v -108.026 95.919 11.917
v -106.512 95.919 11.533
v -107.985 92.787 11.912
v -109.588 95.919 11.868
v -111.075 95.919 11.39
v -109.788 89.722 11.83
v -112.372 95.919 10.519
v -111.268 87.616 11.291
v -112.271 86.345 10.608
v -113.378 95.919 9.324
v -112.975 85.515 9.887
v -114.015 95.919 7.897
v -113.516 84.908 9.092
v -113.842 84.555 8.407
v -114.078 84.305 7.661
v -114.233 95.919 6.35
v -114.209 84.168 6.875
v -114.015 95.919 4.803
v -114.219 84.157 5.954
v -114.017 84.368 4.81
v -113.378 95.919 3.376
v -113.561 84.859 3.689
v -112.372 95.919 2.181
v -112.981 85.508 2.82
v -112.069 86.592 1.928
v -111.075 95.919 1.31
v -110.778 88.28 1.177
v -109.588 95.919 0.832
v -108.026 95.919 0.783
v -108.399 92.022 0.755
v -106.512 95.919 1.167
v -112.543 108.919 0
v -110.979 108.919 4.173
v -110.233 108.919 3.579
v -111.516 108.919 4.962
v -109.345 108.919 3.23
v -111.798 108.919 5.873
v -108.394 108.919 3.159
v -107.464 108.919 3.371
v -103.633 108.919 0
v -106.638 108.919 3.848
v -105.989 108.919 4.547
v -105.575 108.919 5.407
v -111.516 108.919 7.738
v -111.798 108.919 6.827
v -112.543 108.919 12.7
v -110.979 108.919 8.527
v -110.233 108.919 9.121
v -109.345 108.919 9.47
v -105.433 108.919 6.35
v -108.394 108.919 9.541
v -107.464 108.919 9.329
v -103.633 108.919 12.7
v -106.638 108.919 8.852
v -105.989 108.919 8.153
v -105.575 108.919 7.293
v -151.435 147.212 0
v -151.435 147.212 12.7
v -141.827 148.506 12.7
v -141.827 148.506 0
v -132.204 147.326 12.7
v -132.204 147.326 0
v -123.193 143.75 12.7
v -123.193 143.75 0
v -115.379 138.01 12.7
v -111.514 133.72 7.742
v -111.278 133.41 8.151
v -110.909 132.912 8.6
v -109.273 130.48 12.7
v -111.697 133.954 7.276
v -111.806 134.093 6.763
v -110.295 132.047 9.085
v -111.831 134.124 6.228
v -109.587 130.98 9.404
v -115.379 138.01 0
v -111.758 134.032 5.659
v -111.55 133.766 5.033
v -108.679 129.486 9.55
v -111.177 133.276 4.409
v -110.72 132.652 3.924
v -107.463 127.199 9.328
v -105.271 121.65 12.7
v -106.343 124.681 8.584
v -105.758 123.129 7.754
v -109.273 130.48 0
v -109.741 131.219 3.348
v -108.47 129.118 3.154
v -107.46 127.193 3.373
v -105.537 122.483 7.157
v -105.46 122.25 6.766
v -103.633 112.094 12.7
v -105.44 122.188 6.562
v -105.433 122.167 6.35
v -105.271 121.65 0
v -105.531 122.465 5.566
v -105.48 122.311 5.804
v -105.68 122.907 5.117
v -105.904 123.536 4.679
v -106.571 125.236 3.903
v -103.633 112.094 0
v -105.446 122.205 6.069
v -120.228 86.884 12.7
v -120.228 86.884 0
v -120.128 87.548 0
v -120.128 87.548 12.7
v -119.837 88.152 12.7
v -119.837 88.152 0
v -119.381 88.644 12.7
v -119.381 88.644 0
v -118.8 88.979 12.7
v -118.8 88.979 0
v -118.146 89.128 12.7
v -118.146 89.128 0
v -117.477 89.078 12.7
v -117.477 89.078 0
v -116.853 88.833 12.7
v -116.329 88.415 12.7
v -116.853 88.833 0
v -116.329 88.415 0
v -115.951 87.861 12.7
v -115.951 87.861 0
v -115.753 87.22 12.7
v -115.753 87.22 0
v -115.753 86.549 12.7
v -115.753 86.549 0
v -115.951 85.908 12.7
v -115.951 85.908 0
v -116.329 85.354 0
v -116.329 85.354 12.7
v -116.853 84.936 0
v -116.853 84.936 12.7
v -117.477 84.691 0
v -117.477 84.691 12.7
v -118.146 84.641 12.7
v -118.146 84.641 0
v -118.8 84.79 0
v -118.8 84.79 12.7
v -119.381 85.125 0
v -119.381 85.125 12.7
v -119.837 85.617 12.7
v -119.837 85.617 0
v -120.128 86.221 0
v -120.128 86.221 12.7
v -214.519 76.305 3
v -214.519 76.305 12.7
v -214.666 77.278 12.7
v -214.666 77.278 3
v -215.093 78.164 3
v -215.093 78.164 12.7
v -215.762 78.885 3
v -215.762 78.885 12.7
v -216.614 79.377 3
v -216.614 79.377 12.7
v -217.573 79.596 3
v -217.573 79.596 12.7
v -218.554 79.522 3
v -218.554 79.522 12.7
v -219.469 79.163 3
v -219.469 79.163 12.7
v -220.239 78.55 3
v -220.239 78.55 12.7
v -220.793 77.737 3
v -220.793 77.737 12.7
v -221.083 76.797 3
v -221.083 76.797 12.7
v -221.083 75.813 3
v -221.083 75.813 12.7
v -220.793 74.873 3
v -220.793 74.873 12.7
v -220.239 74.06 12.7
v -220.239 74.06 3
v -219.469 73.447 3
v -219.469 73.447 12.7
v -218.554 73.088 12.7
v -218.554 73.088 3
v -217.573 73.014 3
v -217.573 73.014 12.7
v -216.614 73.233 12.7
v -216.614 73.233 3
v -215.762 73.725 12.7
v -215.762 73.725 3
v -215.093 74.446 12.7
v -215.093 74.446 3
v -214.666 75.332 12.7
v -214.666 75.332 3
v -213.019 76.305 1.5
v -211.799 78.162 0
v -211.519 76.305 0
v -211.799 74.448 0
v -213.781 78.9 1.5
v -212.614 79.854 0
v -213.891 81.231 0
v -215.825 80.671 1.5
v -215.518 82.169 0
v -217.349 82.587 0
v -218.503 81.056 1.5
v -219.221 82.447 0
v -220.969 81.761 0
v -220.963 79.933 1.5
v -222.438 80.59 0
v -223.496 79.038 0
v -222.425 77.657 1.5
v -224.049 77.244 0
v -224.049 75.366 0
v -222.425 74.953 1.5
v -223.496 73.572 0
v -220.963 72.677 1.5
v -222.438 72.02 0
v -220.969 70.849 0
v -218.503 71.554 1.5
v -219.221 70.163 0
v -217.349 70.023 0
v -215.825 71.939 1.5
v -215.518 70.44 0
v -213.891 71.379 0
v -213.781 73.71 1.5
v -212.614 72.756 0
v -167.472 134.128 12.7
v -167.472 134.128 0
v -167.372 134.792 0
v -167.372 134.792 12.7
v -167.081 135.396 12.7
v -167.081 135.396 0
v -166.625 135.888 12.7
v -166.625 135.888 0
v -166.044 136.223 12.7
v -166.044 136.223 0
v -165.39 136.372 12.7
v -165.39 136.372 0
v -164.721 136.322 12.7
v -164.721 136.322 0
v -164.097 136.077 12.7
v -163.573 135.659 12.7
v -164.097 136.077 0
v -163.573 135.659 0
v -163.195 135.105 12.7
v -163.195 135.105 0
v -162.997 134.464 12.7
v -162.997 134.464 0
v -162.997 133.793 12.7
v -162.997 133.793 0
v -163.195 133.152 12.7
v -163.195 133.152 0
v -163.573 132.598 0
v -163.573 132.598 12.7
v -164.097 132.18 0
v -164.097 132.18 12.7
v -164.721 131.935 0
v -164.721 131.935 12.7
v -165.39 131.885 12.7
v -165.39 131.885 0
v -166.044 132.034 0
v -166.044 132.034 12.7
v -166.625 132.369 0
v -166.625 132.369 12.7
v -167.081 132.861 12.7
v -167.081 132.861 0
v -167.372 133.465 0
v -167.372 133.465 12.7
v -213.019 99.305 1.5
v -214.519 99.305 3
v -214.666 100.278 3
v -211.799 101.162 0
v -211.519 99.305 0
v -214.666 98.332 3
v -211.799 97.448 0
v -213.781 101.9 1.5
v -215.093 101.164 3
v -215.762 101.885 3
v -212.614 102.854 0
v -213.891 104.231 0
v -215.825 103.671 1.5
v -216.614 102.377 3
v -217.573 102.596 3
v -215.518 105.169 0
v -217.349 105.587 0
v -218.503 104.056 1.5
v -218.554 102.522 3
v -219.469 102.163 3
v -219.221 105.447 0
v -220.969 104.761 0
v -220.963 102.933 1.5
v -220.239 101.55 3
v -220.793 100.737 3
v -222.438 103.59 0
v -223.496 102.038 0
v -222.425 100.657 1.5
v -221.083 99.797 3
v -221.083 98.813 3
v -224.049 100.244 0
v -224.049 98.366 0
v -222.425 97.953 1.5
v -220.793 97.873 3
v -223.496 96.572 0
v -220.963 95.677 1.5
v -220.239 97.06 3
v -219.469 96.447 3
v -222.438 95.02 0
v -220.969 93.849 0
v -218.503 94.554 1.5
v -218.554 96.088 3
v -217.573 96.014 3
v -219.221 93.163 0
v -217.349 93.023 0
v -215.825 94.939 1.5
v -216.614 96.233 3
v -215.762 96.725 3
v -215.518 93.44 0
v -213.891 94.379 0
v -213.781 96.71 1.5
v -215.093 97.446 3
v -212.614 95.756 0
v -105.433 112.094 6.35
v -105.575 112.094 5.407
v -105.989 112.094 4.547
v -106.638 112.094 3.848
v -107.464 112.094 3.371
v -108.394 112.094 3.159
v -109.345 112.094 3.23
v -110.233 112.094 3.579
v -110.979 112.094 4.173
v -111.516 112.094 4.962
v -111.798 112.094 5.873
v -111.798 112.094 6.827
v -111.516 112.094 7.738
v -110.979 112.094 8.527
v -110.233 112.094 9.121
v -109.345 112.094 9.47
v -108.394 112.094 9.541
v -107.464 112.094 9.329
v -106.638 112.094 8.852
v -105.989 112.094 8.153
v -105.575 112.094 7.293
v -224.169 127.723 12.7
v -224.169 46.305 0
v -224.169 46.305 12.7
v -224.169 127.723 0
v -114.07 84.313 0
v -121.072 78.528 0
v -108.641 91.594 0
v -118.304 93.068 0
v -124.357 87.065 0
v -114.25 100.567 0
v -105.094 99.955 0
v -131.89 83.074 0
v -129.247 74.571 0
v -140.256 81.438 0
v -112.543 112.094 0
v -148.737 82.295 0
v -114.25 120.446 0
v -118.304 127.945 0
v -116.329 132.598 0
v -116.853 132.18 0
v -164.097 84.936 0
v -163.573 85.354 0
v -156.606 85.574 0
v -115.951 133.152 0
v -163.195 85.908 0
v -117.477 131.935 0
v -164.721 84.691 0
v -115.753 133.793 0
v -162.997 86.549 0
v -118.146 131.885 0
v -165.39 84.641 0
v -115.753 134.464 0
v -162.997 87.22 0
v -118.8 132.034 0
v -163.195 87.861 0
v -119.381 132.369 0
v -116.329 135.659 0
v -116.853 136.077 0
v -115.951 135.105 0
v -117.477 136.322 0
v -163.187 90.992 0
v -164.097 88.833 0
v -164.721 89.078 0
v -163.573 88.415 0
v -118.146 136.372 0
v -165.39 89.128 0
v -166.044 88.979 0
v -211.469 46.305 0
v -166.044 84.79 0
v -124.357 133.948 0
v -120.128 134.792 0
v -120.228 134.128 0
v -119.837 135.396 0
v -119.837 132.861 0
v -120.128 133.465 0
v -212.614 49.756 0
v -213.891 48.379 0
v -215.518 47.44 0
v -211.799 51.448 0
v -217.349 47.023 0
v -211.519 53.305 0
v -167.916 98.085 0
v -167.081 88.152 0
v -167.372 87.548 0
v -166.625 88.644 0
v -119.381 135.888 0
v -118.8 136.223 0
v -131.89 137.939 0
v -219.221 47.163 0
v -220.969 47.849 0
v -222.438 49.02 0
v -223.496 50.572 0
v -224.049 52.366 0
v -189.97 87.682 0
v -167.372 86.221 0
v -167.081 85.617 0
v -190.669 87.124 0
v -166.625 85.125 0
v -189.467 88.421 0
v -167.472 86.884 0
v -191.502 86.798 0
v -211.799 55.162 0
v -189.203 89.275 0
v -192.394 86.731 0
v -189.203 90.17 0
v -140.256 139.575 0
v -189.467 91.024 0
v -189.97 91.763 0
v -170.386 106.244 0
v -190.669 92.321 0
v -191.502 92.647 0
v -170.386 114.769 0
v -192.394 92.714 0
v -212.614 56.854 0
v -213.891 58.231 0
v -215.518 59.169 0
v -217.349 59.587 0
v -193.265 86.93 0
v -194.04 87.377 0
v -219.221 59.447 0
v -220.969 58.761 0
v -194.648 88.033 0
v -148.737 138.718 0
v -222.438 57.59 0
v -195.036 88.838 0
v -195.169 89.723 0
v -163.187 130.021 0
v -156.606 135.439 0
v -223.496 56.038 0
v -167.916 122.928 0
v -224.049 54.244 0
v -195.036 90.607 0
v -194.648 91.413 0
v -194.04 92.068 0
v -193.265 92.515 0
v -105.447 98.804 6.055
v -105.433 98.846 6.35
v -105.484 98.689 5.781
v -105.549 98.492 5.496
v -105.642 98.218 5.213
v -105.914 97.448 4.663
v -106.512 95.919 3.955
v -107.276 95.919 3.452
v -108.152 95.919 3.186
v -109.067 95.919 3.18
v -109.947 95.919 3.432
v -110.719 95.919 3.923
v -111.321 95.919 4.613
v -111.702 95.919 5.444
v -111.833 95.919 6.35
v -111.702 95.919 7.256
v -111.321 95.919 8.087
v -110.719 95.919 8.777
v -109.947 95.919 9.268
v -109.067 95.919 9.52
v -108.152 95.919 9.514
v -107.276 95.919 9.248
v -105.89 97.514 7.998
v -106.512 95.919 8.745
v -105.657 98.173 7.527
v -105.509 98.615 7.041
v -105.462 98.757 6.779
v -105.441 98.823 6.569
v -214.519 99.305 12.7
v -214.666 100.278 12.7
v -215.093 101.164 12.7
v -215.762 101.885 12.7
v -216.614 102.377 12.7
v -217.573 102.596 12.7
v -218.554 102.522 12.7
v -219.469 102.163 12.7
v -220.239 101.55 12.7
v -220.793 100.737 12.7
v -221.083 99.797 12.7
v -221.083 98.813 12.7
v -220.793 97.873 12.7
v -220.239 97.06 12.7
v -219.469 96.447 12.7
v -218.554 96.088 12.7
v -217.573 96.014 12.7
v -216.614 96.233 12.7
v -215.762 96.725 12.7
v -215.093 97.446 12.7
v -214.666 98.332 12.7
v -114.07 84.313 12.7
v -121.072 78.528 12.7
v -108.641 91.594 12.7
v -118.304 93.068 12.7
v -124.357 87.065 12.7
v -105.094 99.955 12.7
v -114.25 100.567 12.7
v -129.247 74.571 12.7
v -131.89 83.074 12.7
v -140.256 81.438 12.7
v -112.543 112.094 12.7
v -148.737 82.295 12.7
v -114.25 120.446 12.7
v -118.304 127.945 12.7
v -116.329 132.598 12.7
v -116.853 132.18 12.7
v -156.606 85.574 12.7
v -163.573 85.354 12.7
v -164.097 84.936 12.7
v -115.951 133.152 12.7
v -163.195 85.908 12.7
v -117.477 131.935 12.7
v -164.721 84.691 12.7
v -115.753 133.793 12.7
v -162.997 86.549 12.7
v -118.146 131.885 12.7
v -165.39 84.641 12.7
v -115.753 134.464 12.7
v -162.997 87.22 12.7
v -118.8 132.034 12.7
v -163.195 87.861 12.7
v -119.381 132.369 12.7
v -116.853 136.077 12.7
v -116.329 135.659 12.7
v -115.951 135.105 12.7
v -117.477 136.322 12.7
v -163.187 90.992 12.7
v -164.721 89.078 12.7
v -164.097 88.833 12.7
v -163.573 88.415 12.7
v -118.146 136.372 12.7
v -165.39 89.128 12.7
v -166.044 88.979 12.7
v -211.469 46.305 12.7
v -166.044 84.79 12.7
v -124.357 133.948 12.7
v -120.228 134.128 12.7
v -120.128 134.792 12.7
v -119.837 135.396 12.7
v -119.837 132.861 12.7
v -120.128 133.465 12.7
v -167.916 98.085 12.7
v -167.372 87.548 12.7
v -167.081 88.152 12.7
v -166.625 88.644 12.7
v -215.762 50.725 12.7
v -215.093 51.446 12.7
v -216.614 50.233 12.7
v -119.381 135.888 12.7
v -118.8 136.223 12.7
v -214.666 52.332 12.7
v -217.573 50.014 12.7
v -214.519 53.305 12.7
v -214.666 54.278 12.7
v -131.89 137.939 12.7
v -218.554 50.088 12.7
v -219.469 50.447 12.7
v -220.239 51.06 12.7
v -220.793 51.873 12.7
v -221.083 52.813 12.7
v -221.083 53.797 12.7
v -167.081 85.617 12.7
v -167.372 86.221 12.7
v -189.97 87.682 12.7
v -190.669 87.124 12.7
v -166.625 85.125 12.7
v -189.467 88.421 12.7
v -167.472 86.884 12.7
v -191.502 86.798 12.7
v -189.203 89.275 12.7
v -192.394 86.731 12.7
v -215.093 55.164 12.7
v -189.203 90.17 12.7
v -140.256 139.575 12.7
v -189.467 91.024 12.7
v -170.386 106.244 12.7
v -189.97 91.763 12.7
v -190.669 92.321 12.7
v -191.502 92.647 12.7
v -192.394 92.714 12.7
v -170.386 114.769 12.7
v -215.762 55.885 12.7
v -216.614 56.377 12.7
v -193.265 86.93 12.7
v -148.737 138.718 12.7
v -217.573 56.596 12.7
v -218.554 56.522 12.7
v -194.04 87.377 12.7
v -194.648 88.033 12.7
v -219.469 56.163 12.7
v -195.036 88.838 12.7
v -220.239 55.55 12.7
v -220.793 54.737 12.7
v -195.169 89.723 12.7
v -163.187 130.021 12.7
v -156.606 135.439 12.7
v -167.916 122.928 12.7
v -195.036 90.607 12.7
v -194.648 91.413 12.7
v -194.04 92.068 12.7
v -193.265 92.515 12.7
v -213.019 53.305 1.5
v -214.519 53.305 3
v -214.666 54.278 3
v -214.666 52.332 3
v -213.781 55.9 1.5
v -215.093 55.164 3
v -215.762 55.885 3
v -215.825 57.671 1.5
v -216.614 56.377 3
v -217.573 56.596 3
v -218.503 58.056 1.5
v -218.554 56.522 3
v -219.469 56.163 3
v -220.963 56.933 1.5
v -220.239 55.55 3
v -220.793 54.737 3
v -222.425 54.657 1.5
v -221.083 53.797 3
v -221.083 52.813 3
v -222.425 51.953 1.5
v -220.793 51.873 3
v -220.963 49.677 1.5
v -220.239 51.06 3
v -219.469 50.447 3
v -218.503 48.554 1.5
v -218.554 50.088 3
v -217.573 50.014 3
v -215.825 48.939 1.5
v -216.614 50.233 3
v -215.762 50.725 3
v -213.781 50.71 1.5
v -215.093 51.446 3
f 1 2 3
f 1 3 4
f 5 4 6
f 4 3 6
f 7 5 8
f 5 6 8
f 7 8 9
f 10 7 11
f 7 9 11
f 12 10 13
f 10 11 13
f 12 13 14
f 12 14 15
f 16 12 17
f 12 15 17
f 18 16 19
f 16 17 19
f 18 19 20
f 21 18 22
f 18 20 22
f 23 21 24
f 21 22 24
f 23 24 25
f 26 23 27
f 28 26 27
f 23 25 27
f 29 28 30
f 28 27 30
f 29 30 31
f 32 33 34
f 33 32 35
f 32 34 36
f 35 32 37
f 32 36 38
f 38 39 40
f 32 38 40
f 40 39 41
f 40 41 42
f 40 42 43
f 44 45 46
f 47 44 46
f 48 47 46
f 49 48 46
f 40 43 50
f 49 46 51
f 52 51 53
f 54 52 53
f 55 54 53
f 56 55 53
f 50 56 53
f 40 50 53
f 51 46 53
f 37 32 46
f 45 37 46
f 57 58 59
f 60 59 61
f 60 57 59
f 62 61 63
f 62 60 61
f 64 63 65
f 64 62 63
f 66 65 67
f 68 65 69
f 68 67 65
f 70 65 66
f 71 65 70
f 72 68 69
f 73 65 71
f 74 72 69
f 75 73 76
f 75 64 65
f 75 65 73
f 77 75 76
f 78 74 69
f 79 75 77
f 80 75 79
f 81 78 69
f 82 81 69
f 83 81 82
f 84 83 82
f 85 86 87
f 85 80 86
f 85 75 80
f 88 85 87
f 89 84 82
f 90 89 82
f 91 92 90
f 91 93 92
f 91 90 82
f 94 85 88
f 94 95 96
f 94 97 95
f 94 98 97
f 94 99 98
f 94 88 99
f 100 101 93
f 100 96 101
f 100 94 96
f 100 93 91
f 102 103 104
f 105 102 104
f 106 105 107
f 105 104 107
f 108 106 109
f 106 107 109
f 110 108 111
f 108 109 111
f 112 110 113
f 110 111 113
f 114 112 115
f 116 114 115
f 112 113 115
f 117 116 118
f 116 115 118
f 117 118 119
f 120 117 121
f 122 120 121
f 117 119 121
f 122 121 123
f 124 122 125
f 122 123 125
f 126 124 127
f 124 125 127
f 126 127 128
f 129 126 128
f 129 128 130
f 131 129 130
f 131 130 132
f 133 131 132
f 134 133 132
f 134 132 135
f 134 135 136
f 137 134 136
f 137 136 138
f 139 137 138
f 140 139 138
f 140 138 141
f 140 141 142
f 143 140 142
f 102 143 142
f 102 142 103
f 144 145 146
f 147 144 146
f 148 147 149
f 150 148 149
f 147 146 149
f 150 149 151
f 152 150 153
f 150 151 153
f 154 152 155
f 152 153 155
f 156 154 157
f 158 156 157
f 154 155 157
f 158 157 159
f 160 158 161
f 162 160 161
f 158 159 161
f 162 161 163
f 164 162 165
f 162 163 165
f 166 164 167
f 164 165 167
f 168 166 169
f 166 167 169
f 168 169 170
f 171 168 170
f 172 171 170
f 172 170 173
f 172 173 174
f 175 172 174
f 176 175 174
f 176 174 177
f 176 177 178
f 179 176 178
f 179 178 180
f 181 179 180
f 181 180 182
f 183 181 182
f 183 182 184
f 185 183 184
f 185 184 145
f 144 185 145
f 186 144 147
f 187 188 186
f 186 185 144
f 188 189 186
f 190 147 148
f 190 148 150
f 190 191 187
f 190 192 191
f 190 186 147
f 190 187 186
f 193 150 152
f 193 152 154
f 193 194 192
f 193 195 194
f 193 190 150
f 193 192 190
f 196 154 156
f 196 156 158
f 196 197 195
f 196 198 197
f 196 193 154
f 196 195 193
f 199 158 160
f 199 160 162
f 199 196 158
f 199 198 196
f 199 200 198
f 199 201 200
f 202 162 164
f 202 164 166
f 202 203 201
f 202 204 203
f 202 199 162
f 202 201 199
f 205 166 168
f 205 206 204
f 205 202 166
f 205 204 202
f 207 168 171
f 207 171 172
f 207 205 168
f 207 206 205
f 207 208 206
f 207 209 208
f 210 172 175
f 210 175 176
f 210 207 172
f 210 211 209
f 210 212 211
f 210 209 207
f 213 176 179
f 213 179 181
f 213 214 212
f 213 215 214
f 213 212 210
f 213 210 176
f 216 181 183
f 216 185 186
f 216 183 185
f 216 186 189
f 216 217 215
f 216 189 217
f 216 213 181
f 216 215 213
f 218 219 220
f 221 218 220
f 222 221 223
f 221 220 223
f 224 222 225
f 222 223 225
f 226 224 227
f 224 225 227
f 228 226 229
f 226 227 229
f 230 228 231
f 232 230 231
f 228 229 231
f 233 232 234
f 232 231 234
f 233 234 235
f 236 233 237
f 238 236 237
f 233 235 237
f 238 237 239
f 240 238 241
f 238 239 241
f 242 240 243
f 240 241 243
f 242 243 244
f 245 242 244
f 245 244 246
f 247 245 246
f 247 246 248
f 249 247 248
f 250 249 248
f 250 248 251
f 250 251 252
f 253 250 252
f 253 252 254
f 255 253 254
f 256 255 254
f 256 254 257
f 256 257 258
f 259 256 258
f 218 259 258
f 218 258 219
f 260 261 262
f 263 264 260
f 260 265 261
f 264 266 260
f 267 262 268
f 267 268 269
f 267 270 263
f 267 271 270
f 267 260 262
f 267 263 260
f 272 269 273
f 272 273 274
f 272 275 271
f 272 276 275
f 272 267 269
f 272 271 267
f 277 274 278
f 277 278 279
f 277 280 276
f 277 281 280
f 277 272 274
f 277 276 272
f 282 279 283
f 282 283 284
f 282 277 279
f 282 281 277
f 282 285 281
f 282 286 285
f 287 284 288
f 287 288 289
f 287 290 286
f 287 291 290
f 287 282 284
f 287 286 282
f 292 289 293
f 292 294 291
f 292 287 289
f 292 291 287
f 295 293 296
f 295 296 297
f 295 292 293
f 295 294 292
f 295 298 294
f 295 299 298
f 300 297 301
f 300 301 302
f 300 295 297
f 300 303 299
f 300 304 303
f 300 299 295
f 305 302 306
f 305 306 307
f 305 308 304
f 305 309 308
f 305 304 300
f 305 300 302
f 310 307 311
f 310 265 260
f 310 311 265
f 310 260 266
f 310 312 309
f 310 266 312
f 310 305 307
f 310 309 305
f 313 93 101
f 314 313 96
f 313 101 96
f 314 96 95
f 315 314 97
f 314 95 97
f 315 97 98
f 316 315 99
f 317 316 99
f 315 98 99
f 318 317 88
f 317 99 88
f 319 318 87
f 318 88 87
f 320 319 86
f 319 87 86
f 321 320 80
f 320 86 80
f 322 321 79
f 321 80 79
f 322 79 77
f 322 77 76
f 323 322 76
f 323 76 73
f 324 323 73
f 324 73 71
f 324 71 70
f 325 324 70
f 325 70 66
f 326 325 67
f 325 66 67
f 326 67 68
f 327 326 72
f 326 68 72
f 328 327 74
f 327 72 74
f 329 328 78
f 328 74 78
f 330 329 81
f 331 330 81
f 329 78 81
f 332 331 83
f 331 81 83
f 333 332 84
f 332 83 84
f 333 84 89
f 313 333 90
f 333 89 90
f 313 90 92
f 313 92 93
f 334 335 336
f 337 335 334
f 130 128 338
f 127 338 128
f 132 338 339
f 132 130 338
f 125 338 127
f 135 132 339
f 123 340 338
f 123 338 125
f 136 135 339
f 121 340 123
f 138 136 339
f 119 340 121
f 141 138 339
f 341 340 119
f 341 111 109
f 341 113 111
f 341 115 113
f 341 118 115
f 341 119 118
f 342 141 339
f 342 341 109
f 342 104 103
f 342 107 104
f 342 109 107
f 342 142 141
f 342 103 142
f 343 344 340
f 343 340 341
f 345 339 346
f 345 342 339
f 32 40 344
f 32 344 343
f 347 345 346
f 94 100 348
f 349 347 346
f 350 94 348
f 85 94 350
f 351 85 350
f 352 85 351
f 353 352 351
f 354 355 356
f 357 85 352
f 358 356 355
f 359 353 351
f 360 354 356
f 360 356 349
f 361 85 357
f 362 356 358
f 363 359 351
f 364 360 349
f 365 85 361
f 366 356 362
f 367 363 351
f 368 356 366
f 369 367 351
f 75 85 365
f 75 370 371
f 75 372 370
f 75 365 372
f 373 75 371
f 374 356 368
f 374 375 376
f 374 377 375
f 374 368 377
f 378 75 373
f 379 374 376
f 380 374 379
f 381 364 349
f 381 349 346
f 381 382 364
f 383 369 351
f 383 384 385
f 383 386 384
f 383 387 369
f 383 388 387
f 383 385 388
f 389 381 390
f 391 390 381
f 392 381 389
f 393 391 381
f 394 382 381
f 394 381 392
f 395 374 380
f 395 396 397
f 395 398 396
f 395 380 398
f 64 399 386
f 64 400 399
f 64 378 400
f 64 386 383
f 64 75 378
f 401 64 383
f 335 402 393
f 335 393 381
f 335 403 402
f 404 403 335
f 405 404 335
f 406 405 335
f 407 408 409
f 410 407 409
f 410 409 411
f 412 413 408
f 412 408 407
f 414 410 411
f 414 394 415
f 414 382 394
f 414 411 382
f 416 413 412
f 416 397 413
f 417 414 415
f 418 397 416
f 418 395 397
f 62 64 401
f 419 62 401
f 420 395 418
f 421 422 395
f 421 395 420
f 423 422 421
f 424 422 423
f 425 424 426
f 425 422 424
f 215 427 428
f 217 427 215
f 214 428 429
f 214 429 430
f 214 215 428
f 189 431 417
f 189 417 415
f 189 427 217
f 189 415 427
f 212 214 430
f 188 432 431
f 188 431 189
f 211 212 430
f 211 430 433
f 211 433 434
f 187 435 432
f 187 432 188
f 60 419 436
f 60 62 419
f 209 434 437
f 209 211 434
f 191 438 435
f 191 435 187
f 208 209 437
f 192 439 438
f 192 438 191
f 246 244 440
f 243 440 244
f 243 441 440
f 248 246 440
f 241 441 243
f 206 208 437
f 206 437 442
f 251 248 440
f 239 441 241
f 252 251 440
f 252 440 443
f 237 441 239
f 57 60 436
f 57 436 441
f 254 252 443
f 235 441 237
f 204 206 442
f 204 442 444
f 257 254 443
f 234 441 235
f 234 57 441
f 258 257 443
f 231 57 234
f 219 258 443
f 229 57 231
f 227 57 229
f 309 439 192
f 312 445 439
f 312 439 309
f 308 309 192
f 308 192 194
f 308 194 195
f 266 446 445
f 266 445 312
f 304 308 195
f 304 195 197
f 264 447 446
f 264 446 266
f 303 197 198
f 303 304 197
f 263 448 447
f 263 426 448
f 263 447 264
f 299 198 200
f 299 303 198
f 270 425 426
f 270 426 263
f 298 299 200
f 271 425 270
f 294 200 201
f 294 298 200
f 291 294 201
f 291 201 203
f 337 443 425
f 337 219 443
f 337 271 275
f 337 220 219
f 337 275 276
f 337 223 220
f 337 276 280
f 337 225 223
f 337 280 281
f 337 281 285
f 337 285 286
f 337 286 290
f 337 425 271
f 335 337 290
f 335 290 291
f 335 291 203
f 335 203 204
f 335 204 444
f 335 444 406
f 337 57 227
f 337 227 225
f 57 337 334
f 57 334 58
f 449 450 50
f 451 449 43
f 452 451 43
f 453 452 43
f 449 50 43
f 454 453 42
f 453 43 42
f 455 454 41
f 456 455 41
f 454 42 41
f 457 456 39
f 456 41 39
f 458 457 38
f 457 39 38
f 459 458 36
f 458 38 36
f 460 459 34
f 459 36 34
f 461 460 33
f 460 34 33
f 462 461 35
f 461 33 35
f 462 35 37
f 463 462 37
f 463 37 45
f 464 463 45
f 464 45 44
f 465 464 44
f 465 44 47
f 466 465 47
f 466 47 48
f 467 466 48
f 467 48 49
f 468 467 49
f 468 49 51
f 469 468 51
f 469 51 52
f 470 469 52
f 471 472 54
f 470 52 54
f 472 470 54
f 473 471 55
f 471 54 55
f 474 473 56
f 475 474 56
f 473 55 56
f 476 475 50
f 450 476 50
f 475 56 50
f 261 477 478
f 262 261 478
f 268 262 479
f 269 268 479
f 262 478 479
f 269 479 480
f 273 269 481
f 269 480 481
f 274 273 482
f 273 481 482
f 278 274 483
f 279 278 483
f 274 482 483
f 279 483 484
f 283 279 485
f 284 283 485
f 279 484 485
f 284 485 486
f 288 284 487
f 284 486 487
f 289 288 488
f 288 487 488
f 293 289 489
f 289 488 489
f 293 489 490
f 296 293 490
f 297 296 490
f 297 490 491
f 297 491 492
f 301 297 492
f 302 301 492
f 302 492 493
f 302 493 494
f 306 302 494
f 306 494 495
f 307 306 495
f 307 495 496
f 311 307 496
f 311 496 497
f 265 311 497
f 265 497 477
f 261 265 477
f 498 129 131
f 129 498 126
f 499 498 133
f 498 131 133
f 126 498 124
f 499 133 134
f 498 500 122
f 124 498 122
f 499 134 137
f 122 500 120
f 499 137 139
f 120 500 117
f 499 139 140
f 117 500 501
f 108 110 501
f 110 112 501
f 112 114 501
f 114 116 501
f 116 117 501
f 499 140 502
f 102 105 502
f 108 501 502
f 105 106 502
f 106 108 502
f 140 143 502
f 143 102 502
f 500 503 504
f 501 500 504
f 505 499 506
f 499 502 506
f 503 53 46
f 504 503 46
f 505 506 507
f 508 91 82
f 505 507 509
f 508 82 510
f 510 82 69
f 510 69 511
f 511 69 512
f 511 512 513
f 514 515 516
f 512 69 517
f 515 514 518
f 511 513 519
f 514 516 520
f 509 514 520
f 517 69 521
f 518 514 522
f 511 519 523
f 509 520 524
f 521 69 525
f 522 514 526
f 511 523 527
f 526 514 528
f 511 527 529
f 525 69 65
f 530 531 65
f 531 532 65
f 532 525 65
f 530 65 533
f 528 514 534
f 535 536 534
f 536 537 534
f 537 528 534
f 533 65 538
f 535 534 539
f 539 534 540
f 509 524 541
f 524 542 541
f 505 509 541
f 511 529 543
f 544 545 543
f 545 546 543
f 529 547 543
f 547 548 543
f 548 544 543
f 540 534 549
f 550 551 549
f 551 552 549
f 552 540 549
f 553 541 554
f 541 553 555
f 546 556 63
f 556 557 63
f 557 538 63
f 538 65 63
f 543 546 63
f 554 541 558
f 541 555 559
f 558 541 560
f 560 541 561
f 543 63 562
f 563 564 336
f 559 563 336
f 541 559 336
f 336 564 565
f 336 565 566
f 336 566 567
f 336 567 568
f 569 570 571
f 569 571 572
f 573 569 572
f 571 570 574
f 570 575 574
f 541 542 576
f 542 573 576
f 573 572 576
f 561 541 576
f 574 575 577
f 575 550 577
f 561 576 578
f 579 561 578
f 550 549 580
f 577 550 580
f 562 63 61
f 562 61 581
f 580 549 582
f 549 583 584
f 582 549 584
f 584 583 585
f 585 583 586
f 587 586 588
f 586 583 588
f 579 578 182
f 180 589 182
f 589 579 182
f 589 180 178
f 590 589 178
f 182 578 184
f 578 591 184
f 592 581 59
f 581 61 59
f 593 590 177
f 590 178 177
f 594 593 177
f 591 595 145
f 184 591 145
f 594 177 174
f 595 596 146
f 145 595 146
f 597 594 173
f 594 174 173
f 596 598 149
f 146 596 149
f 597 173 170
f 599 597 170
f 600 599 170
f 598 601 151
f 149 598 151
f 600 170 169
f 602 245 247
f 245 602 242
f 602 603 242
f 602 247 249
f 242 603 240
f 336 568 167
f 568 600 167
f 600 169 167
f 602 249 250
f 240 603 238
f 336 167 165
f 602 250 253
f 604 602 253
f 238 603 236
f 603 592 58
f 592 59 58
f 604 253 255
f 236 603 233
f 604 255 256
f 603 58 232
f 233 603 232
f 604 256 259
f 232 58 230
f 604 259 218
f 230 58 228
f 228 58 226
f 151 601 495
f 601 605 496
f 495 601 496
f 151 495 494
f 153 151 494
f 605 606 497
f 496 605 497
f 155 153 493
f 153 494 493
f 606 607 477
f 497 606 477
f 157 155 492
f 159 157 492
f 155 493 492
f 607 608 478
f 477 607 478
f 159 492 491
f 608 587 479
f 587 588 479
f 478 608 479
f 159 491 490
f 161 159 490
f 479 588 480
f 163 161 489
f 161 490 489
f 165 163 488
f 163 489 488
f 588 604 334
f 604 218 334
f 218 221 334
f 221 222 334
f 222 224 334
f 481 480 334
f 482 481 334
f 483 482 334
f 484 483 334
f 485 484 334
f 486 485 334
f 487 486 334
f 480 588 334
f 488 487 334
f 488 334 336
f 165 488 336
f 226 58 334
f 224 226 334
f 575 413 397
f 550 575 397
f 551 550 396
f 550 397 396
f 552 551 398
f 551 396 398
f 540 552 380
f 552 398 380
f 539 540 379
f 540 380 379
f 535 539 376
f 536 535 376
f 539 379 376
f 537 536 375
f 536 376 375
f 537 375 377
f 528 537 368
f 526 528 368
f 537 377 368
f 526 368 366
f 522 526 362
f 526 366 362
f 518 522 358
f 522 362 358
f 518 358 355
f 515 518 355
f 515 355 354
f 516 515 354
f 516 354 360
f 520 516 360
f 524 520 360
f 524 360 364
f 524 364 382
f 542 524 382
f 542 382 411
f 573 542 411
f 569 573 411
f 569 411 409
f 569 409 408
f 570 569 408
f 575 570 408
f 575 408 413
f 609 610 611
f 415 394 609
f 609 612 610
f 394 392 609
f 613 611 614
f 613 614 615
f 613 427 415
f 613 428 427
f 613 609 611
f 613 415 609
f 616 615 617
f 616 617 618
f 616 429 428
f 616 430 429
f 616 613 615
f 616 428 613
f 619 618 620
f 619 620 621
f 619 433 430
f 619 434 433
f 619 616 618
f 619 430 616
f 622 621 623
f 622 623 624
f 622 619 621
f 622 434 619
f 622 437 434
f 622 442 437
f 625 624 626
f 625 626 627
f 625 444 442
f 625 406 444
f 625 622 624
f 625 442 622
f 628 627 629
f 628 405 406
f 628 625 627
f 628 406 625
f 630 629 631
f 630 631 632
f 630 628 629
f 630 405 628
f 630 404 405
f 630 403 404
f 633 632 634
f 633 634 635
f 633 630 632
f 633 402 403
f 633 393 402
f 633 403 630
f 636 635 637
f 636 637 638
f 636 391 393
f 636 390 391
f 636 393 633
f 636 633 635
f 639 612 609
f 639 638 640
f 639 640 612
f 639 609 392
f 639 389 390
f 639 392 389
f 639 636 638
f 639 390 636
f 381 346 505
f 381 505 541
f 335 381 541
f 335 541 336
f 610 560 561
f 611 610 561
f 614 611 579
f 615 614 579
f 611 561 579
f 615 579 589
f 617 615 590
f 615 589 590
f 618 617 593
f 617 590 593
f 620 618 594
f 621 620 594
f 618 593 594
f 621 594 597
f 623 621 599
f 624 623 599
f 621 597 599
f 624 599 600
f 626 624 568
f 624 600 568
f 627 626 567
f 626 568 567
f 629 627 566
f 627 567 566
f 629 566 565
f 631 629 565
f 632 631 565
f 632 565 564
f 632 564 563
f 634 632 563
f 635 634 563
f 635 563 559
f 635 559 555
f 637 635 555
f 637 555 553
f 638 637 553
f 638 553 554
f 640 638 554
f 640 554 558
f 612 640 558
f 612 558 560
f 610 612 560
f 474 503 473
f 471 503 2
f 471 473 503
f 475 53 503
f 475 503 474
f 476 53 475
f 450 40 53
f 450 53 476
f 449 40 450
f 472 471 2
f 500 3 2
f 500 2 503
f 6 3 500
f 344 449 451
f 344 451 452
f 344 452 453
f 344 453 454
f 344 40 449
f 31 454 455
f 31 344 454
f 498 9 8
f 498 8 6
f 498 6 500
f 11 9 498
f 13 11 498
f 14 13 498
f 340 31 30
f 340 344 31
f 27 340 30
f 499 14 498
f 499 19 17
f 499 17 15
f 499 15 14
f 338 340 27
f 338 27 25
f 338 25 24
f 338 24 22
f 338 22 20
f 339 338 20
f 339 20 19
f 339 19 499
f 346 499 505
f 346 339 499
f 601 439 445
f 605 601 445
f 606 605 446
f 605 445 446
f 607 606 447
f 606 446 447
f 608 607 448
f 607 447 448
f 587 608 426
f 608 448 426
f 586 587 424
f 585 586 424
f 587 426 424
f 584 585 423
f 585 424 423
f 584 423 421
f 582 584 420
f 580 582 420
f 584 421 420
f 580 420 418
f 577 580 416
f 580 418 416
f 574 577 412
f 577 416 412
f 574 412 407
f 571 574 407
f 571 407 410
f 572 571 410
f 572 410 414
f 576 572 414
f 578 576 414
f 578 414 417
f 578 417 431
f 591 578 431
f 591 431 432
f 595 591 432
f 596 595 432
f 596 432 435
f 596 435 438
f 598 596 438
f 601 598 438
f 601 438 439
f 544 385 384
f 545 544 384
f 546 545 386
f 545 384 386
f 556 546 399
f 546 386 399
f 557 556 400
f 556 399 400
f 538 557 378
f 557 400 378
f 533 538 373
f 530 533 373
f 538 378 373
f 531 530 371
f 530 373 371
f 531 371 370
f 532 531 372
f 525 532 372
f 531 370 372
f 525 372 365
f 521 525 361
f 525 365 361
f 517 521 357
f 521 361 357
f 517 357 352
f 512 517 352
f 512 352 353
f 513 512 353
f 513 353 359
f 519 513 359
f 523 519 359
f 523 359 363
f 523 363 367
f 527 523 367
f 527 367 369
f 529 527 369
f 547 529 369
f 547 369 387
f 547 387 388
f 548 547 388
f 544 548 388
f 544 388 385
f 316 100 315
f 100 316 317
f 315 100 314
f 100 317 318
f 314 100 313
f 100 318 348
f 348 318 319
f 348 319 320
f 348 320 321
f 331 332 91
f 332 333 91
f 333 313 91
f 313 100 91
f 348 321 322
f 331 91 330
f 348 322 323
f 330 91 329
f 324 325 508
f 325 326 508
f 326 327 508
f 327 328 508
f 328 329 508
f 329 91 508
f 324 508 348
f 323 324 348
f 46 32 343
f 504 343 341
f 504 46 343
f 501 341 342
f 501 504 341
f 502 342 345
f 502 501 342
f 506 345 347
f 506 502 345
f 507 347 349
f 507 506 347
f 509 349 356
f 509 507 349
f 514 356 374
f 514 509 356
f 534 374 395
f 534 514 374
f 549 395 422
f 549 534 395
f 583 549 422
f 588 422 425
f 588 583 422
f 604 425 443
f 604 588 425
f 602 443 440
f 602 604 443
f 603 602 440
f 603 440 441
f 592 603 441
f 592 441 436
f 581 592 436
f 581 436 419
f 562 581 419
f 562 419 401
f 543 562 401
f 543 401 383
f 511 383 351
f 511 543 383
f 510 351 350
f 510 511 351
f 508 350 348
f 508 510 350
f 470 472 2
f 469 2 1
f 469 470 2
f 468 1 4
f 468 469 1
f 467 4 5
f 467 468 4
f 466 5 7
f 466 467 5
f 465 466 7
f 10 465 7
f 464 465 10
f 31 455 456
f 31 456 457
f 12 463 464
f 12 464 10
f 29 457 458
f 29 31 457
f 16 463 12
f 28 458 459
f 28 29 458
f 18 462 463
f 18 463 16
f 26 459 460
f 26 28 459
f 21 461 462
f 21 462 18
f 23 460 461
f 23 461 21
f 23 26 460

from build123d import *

# Parameters (mm, degrees)
BOSS_EXTRUDE1_DEPTH     = 12.7
CUT_EXTRUDE1_DEPTH      = 270.19769127
SKETCH3_W               = 29.1
SKETCH3_H               = 12.7
F_12_CLEARANCE_HOLE1_D  = 6
F_8_CLEARANCE_HOLE1_D   = 4.5
F_1_4_CLEARANCE_HOLE1_D = 6.6
SKETCH10_W              = 2.5
SKETCH10_H              = 36.4125
HOLE1_D                 = 6.4
HOLE1_DEPTH             = 64.36393101
HOLE1_CBORE_D           = 11.2
HOLE1_CBORE_DEPTH       = 11.77643101
CHAMFER1_SIZE           = 3


with BuildPart() as part:
    # Sketch1 → Boss-Extrude1 (new body)
    with BuildSketch(Plane(origin=(0, 0, 0), x_dir=(-1, 0, 0), z_dir=(0, 0, -1))):
        with BuildLine():
            Line((129.246532787, 74.570537656), (211.469455465, 46.304993078))
            Line((211.469455465, 46.304993078), (224.169455465, 46.304993078))
            Line((224.169455465, 46.304993078), (224.169455465, 127.72254562))
            Line((224.169455465, 127.72254562), (151.435240745, 147.211619716))
            ThreePointArc((151.435240745, 147.211619716), (105.257753851, 121.607458019), (129.246532787, 74.570537656))
        make_face()
    extrude(amount=-BOSS_EXTRUDE1_DEPTH)

    # Sketch2 → Cut-Extrude1 (cut, through all)
    with BuildSketch(Plane.XY.offset(12.7)):
        with BuildLine():
            Line((-103.633291463, 112.093938317), (-113.069248332, 112.093938317))
            ThreePointArc((-113.069248332, 112.093938317), (-113.025117032, 110.506438317), (-113.069248332, 108.918938317))
            Line((-113.069248332, 108.918938317), (-103.633291463, 108.918938317))
            ThreePointArc((-103.633291463, 108.918938317), (-103.600117032, 110.506438317), (-103.633291463, 112.093938317))
        make_face()
    extrude(amount=-CUT_EXTRUDE1_DEPTH, mode=Mode.SUBTRACT)

    # Sketch3 → Cut-Revolve1 (revolve, cut)
    with BuildSketch(Plane.XZ.offset(-110.506438317)):
        with Locations((-127.050117032, 6.35)):
            Rectangle(SKETCH3_W, SKETCH3_H)
    revolve(axis=Axis((-141.600117032, 110.506438317, 12.7), (0, 0, -1)), mode=Mode.SUBTRACT)

    # #12 Clearance Hole1 (through all)
    with Locations(Plane.XY.offset(12.7)):
        with Locations((-192.169455465, 89.72254562)):
            Hole(F_12_CLEARANCE_HOLE1_D / 2)

    # #8 Clearance Hole1 (through all)
    with Locations(Plane.XY.offset(12.7)):
        with Locations((-117.978117032, 86.884438317), (-165.222117032, 86.884438317), (-165.222117032, 134.128438317), (-117.978117032, 134.128438317)):
            Hole(F_8_CLEARANCE_HOLE1_D / 2)

    # 1/4 Clearance Hole1 (through all)
    with Locations(Plane(origin=(0, 0, 0), x_dir=(-1, 0, 0), z_dir=(0, 0, -1))):
        with Locations((217.819455465, 53.304993078), (217.819455465, 76.304993078), (217.819455465, 99.304993078)):
            Hole(F_1_4_CLEARANCE_HOLE1_D / 2)

    # Sketch10 → #10 Clearance Hole1 (revolve, cut)
    with BuildSketch(Plane(origin=(-108.633291463, 112.093938317, 6.35), x_dir=(0, 0, -1), z_dir=(1, 0, 0))):
        with Locations((1.25, 18.20625)):
            Rectangle(SKETCH10_W, SKETCH10_H)
    revolve(axis=Axis((-108.633291463, 105.743938317, 6.35), (0, 1, 0)), mode=Mode.SUBTRACT)

    # Hole1
    with Locations(Plane(origin=(0, 84.142507307, 0), x_dir=(-1, 0, 0), z_dir=(0, -1, 0))):
        with Locations((108.633291463, -6.35)):
            CounterBoreHole(HOLE1_D / 2, HOLE1_CBORE_D / 2, HOLE1_CBORE_DEPTH, depth=HOLE1_DEPTH)

    # Chamfer1
    chamfer1_edges = [part.edges().sort_by_distance(p)[0] for p in [
        (-221.119455465, 99.304993078, 0),
        (-221.119455465, 76.304993078, 0),
        (-221.119455465, 53.304993078, 0),
    ]]
    chamfer(chamfer1_edges, length=CHAMFER1_SIZE)


solid = part.part
